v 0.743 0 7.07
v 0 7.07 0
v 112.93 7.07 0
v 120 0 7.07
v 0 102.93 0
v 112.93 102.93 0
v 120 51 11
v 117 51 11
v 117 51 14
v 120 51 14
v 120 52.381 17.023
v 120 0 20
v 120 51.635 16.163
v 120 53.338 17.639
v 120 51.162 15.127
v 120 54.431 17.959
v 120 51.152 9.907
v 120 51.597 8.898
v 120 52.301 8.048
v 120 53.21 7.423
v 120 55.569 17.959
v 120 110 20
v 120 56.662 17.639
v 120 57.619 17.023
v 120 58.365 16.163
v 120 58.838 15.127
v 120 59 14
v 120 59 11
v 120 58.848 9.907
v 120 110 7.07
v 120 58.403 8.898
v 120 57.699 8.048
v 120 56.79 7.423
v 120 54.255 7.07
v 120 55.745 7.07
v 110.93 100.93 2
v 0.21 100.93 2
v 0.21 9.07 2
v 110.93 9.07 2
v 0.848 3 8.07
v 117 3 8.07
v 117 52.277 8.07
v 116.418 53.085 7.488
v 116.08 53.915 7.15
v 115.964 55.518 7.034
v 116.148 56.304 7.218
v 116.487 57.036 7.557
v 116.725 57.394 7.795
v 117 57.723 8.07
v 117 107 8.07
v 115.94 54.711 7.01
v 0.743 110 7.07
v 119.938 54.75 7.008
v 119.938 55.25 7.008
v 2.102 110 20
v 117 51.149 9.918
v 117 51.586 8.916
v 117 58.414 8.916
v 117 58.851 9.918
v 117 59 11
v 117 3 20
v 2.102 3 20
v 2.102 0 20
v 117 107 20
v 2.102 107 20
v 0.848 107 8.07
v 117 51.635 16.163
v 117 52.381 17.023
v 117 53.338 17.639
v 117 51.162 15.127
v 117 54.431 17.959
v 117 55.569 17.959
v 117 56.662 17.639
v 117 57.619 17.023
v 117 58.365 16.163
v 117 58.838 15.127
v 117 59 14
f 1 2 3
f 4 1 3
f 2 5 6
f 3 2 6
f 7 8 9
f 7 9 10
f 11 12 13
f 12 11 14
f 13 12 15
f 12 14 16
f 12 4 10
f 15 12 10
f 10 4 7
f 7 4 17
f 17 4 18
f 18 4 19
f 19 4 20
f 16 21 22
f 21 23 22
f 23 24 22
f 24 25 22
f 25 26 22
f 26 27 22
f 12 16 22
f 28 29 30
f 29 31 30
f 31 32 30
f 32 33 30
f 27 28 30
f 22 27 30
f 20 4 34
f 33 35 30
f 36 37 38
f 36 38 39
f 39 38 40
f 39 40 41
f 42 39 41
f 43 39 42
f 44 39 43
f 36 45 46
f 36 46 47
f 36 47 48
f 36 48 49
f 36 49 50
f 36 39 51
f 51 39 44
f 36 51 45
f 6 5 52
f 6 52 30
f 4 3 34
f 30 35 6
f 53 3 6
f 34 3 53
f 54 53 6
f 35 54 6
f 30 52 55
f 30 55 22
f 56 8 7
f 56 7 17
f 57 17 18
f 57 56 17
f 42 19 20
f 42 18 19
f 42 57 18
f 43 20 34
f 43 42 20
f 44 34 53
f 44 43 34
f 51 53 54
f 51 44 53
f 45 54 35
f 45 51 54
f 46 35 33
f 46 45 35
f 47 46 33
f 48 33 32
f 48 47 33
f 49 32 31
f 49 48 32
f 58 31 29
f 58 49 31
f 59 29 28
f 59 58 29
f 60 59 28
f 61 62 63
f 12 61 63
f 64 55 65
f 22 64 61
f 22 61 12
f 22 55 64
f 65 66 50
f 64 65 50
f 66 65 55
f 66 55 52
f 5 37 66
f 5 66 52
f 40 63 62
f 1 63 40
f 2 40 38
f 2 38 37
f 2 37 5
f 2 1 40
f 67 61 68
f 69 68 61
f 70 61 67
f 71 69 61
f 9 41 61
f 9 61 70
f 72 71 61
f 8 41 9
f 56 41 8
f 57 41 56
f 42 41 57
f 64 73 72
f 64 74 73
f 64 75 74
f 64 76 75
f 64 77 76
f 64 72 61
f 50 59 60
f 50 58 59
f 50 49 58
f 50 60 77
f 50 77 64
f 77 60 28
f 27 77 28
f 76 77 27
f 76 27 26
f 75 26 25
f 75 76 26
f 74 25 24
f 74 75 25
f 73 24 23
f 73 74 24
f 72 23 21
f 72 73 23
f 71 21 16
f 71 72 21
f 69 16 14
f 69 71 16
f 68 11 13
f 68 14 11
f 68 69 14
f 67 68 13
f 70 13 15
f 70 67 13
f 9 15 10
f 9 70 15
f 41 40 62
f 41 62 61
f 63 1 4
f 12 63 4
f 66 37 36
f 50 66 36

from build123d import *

# Parameters (mm, degrees)
CYLINDER001_R     = 4
CYLINDER001_DEPTH = 10
BOX011_W          = 10
BOX011_H          = 8
BOX011_DEPTH      = 3
CYLINDER002_R     = 4
CYLINDER002_DEPTH = 10
PAD002_DEPTH      = 110
BOX010_W          = 117
BOX010_H          = 104
BOX010_DEPTH      = 18
CHAMFER002_SIZE   = 6.07
BOX009_W          = 120
BOX009_H          = 110
BOX009_DEPTH      = 20
CHAMFER001_SIZE   = 7.07


with BuildPart() as cylinder001:
    # Cylinder001 → Cylinder001 (new body)
    with BuildSketch(Plane(origin=(0, 0, 6), x_dir=(0, 0, -1), z_dir=(1, 0, 0))):
        Circle(CYLINDER001_R)
    extrude(amount=CYLINDER001_DEPTH)


with BuildPart() as cube011:
    # Box011 → Box011 (new body)
    with BuildSketch(Plane(origin=(0, -4, 3), x_dir=(1, 0, 0), z_dir=(0, 0, 1))):
        with Locations((5, 4)):
            Rectangle(BOX011_W, BOX011_H)
    extrude(amount=BOX011_DEPTH)


with BuildPart() as stromloch:
    # Cylinder002 → Cylinder002 (new body)
    with BuildSketch(Plane(origin=(0, 0, 3), x_dir=(0, 0, -1), z_dir=(1, 0, 0))):
        Circle(CYLINDER002_R)
    extrude(amount=CYLINDER002_DEPTH)

    # Fusion002: union Cylinder001, Cube011
    add(cylinder001.part)
    add(cube011.part)


with BuildPart() as stromloch_1:
    # Fusion002 placement: moved
    add(stromloch.part.moved(Location((111, 55, 8))))


with BuildPart() as pad002:
    # Sketch002 → Pad002 (new body)
    with BuildSketch(Plane.XZ):
        Polygon((0, 0), (0, 23), (2.417397, 23), align=None)
    extrude(amount=-PAD002_DEPTH)


with BuildPart() as chamfer002:
    # Box010 → Box010 (new body)
    with BuildSketch(Plane(origin=(0, 3, 2), x_dir=(1, 0, 0), z_dir=(0, 0, 1))):
        with Locations((58.5, 52)):
            Rectangle(BOX010_W, BOX010_H)
    extrude(amount=BOX010_DEPTH)

    # Chamfer002
    chamfer002_edges = [chamfer002.edges().sort_by_distance(p)[0] for p in [
        (117, 55, 2),
        (58.5, 3, 2),
        (58.5, 107, 2),
    ]]
    chamfer(chamfer002_edges, length=CHAMFER002_SIZE)


with BuildPart() as boden_stromloch:
    # Box009 → Box009 (new body)
    with BuildSketch(Plane.XY):
        with Locations((60, 55)):
            Rectangle(BOX009_W, BOX009_H)
    extrude(amount=BOX009_DEPTH)

    # Chamfer001
    chamfer001_edges = [boden_stromloch.edges().sort_by_distance(p)[0] for p in [
        (120, 55, 0),
        (60, 0, 0),
        (60, 110, 0),
    ]]
    chamfer(chamfer001_edges, length=CHAMFER001_SIZE)

    # Cut006: cut Chamfer002
    add(chamfer002.part, mode=Mode.SUBTRACT)

    # Cut007: cut Pad002
    add(pad002.part, mode=Mode.SUBTRACT)

    # Cut008: cut Stromloch
    add(stromloch_1.part, mode=Mode.SUBTRACT)


solid = boden_stromloch.part
